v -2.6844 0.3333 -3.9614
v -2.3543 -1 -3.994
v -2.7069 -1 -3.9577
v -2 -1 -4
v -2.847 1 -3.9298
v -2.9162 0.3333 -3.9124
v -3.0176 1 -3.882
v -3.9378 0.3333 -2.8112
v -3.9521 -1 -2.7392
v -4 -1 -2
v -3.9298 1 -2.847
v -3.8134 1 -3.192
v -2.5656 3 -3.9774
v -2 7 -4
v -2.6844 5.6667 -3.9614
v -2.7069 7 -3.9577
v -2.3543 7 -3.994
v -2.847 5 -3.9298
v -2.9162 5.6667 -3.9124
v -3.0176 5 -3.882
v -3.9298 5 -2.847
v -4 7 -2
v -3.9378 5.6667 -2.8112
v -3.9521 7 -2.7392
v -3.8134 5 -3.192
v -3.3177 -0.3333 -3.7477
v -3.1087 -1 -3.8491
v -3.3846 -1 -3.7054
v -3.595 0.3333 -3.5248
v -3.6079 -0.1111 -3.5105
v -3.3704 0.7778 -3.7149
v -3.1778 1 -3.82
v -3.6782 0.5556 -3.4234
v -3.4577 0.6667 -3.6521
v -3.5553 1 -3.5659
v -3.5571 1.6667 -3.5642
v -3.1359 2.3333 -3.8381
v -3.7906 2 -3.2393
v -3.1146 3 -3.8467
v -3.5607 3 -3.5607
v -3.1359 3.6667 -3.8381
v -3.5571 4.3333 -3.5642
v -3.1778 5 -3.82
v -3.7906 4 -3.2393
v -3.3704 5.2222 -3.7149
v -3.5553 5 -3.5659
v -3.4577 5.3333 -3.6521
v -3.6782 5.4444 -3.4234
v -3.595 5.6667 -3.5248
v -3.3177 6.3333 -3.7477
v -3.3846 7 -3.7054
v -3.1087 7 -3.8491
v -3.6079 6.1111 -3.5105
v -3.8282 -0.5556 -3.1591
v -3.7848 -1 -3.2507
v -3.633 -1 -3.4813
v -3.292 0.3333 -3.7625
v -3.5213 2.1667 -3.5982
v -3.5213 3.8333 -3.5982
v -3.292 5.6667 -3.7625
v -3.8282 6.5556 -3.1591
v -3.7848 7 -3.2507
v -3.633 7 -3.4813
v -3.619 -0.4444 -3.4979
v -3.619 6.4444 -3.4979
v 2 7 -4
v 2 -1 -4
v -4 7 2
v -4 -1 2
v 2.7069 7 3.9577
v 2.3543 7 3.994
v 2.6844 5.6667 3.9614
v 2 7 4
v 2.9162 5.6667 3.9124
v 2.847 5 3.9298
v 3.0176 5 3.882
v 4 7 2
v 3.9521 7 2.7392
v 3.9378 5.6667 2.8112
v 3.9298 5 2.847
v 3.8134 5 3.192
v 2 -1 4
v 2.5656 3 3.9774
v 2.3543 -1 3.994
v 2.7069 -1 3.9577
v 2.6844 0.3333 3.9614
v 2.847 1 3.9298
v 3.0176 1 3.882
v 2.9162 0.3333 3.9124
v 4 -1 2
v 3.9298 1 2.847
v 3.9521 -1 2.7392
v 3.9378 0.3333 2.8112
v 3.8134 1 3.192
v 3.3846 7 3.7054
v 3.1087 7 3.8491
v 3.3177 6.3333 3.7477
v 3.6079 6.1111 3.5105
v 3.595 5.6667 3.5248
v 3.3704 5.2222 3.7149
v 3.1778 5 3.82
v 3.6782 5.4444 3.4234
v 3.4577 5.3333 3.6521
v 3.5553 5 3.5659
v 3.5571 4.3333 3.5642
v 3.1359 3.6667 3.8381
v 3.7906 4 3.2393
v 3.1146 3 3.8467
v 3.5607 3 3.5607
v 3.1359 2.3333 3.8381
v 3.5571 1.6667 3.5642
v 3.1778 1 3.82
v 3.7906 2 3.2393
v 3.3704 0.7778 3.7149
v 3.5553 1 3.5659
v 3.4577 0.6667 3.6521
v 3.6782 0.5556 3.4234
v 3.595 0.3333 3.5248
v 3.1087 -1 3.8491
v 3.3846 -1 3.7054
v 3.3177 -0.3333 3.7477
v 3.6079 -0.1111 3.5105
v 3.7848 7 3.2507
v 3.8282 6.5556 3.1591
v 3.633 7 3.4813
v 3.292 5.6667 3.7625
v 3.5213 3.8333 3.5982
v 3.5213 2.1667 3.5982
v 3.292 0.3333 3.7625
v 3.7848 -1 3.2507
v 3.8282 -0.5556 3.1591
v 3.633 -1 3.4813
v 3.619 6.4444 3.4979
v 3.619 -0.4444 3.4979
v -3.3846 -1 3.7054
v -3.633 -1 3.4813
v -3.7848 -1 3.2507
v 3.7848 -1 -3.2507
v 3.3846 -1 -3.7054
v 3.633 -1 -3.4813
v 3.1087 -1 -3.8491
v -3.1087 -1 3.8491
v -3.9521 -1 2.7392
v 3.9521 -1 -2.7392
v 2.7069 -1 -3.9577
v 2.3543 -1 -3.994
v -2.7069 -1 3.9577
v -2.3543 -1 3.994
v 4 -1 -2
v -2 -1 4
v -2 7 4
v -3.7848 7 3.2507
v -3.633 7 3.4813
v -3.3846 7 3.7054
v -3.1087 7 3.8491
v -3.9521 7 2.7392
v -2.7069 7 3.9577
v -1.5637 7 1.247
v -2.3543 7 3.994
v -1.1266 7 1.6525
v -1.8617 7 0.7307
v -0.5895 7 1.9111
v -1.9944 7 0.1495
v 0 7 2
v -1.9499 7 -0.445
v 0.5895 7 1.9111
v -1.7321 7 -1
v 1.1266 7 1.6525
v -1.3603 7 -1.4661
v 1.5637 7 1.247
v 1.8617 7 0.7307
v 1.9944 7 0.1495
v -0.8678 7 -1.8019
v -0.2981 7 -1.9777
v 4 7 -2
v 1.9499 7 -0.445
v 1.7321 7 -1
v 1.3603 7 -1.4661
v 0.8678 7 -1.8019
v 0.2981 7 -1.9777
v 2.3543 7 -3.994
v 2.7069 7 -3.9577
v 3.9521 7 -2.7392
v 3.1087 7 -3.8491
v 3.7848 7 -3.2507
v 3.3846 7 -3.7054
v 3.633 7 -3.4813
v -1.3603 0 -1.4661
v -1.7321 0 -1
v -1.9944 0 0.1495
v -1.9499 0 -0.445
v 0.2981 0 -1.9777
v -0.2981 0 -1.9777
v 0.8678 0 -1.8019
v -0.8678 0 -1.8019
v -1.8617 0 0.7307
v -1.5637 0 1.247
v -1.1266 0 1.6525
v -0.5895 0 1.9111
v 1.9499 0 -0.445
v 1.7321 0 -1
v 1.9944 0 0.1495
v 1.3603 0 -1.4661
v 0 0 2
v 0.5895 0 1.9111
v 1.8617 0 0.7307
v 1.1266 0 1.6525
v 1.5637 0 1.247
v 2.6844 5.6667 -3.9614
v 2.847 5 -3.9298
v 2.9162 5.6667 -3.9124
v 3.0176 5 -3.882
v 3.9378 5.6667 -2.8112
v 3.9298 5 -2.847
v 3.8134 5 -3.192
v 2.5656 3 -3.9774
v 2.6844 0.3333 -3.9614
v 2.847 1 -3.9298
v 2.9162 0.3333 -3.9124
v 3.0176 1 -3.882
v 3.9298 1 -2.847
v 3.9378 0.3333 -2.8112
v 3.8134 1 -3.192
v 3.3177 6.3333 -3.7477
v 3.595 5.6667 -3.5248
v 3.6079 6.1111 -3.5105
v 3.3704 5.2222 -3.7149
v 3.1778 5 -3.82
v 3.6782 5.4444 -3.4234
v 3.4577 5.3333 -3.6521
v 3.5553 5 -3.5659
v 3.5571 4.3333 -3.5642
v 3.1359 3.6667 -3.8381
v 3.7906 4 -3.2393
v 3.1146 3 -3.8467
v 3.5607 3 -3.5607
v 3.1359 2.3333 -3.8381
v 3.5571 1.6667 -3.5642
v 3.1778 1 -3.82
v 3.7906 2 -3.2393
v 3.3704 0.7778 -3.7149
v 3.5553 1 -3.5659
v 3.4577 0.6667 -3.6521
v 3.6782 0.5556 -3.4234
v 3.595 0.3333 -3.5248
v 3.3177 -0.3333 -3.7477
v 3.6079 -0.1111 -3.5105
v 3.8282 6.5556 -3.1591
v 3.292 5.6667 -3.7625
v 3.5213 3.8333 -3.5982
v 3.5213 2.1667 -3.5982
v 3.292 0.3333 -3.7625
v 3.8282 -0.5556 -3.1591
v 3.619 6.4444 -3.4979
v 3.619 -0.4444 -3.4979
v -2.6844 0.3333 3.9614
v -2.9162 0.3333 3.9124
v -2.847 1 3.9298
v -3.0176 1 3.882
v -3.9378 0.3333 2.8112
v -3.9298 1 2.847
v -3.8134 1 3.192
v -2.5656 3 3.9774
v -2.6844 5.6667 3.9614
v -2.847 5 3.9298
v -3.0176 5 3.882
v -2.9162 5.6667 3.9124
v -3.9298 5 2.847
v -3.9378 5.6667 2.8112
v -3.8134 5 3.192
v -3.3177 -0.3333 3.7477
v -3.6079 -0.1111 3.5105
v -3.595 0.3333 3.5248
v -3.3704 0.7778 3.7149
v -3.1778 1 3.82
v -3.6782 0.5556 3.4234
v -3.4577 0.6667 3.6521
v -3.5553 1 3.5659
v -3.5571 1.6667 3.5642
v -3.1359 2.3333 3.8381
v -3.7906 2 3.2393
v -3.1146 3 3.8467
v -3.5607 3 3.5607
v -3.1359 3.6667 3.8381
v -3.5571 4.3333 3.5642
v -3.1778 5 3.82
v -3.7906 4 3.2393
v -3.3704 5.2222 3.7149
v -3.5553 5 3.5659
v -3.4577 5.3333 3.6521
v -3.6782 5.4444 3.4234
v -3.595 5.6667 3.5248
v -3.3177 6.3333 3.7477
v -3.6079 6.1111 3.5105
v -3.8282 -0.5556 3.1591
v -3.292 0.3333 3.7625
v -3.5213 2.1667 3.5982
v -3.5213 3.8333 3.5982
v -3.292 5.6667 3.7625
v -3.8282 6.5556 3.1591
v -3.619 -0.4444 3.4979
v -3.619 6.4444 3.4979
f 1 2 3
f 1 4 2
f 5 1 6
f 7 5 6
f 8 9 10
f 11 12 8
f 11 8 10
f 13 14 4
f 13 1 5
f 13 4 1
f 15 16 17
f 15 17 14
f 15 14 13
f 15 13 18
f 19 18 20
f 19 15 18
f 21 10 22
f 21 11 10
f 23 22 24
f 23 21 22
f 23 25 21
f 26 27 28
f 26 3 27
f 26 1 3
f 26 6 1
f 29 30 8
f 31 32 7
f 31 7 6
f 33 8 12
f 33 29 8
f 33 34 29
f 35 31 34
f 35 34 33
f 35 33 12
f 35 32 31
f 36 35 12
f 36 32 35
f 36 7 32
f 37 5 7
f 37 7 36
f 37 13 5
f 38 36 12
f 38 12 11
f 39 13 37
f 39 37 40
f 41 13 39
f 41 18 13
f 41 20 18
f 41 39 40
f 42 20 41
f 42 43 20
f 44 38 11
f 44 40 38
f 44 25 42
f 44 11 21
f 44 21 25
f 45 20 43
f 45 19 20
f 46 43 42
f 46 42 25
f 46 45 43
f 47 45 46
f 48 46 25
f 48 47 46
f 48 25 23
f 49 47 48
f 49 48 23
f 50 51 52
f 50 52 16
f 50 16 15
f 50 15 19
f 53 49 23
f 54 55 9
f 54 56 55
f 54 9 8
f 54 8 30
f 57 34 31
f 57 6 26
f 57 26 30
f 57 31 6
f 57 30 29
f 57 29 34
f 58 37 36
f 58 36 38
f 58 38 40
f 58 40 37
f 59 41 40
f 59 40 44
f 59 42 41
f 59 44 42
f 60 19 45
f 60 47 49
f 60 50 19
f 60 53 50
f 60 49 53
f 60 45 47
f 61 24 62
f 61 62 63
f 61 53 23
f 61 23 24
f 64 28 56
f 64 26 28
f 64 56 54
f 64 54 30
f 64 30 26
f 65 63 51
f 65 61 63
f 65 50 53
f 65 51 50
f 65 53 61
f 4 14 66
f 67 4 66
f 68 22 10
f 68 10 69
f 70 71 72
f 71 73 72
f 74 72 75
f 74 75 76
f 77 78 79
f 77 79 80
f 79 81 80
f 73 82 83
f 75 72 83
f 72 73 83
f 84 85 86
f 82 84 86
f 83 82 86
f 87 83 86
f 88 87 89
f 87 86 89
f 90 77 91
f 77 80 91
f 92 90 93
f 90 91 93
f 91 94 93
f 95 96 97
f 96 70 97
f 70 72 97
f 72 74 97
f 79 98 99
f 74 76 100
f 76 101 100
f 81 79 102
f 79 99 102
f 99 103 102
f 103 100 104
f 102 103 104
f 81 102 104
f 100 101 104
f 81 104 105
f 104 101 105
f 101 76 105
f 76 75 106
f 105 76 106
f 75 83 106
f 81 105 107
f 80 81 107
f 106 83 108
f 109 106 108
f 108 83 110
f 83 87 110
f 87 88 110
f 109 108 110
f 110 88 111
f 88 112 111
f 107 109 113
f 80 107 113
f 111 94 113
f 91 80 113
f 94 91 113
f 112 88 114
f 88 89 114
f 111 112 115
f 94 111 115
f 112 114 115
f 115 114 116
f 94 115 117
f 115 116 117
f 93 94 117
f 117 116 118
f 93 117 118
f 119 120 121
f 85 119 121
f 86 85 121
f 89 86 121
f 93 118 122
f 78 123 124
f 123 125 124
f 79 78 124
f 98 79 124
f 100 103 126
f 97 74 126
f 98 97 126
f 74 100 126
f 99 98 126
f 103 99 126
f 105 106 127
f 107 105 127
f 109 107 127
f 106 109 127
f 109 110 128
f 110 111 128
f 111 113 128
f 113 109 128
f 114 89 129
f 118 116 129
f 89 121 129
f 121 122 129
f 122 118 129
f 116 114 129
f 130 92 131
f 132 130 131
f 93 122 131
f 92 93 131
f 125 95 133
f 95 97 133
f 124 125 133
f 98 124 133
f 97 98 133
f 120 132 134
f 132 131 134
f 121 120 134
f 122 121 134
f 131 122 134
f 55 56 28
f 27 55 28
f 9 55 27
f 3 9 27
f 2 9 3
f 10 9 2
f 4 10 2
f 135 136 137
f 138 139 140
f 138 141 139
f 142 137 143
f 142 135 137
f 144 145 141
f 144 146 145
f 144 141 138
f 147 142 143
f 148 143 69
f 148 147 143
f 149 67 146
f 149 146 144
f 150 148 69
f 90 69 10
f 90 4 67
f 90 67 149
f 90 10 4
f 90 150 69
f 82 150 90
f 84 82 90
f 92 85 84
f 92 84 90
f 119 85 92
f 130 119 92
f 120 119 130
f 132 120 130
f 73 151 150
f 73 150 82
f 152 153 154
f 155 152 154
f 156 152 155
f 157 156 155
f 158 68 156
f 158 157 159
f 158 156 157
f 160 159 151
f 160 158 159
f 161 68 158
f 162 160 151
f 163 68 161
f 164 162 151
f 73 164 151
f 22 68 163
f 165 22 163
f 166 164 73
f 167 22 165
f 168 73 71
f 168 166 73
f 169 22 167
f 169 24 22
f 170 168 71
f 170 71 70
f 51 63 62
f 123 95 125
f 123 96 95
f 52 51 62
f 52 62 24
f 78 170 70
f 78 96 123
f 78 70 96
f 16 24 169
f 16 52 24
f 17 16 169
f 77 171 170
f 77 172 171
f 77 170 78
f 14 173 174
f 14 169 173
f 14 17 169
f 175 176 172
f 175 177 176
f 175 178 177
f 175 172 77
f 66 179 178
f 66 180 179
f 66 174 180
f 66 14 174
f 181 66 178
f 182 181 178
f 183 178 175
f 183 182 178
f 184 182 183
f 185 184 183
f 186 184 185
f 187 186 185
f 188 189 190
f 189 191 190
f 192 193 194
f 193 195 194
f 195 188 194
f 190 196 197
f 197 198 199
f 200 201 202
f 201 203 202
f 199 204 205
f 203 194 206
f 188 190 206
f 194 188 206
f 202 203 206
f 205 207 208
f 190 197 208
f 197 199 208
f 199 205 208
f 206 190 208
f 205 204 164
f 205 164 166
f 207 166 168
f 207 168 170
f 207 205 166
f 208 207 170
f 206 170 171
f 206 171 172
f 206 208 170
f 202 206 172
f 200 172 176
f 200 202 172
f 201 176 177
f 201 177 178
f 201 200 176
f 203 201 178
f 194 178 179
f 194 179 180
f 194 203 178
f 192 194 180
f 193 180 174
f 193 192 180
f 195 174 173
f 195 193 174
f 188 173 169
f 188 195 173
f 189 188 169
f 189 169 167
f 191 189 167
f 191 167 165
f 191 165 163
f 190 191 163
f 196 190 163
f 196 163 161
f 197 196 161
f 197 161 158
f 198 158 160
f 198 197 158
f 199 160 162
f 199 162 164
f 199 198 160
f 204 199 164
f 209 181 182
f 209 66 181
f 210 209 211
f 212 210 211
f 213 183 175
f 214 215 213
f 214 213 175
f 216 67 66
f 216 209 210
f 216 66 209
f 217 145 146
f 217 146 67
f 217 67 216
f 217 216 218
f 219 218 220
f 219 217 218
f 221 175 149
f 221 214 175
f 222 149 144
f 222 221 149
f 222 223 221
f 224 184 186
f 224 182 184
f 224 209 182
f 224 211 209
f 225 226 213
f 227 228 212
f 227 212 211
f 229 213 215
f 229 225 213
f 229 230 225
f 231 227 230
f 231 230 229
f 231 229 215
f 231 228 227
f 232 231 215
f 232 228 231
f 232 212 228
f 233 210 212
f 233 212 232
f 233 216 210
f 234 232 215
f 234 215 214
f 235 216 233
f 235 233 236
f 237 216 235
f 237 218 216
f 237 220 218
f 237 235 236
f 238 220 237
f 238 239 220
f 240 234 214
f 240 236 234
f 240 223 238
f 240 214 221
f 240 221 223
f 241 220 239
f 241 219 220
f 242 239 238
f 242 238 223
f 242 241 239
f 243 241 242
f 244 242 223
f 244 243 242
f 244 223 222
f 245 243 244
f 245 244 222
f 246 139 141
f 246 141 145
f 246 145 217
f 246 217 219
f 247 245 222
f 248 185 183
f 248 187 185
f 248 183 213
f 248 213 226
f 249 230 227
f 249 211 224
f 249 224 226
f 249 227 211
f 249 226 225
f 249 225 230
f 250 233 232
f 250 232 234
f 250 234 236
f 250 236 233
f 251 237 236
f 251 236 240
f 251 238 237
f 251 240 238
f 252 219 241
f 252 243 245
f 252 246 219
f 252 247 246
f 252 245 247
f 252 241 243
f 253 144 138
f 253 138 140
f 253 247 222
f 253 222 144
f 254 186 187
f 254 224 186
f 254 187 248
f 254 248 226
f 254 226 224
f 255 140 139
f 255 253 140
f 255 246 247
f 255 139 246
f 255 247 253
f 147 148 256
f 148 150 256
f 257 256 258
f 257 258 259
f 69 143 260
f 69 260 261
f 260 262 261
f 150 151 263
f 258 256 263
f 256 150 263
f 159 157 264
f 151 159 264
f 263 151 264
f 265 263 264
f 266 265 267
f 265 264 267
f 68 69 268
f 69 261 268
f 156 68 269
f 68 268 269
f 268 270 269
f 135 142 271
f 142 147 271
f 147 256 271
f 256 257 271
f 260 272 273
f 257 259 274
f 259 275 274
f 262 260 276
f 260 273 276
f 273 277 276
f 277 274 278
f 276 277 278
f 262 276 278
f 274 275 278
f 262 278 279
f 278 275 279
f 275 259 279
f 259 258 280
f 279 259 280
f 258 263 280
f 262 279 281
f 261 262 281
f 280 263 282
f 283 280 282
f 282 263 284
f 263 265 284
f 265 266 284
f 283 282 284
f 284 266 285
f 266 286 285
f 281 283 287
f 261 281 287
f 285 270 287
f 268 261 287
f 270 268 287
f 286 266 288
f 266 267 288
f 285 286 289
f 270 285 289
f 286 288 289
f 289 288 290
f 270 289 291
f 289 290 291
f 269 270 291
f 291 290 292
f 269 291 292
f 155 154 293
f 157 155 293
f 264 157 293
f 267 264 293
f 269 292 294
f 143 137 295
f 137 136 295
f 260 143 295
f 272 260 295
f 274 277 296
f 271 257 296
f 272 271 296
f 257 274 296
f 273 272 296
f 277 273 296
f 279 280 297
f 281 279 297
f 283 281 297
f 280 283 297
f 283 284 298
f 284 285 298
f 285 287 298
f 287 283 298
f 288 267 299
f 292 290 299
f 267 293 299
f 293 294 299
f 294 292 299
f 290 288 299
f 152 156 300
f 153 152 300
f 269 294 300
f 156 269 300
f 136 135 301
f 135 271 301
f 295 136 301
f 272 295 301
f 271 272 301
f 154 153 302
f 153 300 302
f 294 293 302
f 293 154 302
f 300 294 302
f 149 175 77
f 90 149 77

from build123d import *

# Parameters (mm, degrees)
SKETCH2_W           = 8
SKETCH2_H           = 8
SKETCH2_R           = 2
BOSS_EXTRUDE1_DEPTH = 7
SKETCH3_W           = 8
SKETCH3_H           = 8
BOSS_EXTRUDE2_DEPTH = 1
FILLET1_SIZE        = 2


with BuildPart() as part:
    # Sketch2 → Boss-Extrude1 (new body)
    with BuildSketch(Plane(origin=(0, 0, 0), x_dir=(1, 0, 0), z_dir=(0, 1, 0))):
        Rectangle(SKETCH2_W, SKETCH2_H)
        with Locations(Location((0, 0, 0), (0, 0, 270))):
            Circle(SKETCH2_R, mode=Mode.SUBTRACT)
    extrude(amount=BOSS_EXTRUDE1_DEPTH)

    # Sketch3 → Boss-Extrude2 (add)
    with BuildSketch(Plane.XZ):
        Rectangle(SKETCH3_W, SKETCH3_H)
    extrude(amount=BOSS_EXTRUDE2_DEPTH)

    # Fillet1
    # a fillet whose section is not a circle: 2 mm, written as the material it takes off along each edge
    with BuildSketch(Plane(origin=(4, -6, 4), x_dir=(-1, 0, 0), z_dir=(0, 1, 0)), Plane(origin=(-4, 12, 4), x_dir=(1, 0, 0), z_dir=(0, -1, 0))) as fillet1_piece_1:
        with BuildLine():
            add(Edge.make_bspline([(FILLET1_SIZE, 0), (FILLET1_SIZE * 0.831801948466, 0), (FILLET1_SIZE * 0.663603896932, 0), (FILLET1_SIZE * 0.292893218813, -FILLET1_SIZE * 0.0716919198361), (FILLET1_SIZE * 0.0716919198361, -FILLET1_SIZE * 0.292893218813), (0, -FILLET1_SIZE * 0.663603896932), (0, -FILLET1_SIZE * 0.831801948466), (0, -FILLET1_SIZE)], knots=[0, 0, 0, 0, 0, 0, 0.5, 0.5, 1, 1, 1, 1, 1, 1], degree=5))
            Line((0, -FILLET1_SIZE), (0, 0))
            Line((0, 0), (FILLET1_SIZE, 0))
        make_face()
    extrude(amount=18, mode=Mode.SUBTRACT)
    with BuildSketch(Plane(origin=(-4, 12, -4), x_dir=(1, 0, 0), z_dir=(0, -1, 0)), Plane(origin=(4, -6, -4), x_dir=(-1, 0, 0), z_dir=(0, 1, 0))) as fillet1_piece_2:
        with BuildLine():
            add(Edge.make_bspline([(FILLET1_SIZE, 0), (FILLET1_SIZE * 0.831801948466, 0), (FILLET1_SIZE * 0.663603896932, 0), (FILLET1_SIZE * 0.292893218813, FILLET1_SIZE * 0.0716919198361), (FILLET1_SIZE * 0.0716919198361, FILLET1_SIZE * 0.292893218813), (0, FILLET1_SIZE * 0.663603896932), (0, FILLET1_SIZE * 0.831801948466), (0, FILLET1_SIZE)], knots=[0, 0, 0, 0, 0, 0, 0.5, 0.5, 1, 1, 1, 1, 1, 1], degree=5))
            Line((0, FILLET1_SIZE), (0, 0))
            Line((0, 0), (FILLET1_SIZE, 0))
        make_face()
    extrude(amount=18, mode=Mode.SUBTRACT)


solid = part.part
